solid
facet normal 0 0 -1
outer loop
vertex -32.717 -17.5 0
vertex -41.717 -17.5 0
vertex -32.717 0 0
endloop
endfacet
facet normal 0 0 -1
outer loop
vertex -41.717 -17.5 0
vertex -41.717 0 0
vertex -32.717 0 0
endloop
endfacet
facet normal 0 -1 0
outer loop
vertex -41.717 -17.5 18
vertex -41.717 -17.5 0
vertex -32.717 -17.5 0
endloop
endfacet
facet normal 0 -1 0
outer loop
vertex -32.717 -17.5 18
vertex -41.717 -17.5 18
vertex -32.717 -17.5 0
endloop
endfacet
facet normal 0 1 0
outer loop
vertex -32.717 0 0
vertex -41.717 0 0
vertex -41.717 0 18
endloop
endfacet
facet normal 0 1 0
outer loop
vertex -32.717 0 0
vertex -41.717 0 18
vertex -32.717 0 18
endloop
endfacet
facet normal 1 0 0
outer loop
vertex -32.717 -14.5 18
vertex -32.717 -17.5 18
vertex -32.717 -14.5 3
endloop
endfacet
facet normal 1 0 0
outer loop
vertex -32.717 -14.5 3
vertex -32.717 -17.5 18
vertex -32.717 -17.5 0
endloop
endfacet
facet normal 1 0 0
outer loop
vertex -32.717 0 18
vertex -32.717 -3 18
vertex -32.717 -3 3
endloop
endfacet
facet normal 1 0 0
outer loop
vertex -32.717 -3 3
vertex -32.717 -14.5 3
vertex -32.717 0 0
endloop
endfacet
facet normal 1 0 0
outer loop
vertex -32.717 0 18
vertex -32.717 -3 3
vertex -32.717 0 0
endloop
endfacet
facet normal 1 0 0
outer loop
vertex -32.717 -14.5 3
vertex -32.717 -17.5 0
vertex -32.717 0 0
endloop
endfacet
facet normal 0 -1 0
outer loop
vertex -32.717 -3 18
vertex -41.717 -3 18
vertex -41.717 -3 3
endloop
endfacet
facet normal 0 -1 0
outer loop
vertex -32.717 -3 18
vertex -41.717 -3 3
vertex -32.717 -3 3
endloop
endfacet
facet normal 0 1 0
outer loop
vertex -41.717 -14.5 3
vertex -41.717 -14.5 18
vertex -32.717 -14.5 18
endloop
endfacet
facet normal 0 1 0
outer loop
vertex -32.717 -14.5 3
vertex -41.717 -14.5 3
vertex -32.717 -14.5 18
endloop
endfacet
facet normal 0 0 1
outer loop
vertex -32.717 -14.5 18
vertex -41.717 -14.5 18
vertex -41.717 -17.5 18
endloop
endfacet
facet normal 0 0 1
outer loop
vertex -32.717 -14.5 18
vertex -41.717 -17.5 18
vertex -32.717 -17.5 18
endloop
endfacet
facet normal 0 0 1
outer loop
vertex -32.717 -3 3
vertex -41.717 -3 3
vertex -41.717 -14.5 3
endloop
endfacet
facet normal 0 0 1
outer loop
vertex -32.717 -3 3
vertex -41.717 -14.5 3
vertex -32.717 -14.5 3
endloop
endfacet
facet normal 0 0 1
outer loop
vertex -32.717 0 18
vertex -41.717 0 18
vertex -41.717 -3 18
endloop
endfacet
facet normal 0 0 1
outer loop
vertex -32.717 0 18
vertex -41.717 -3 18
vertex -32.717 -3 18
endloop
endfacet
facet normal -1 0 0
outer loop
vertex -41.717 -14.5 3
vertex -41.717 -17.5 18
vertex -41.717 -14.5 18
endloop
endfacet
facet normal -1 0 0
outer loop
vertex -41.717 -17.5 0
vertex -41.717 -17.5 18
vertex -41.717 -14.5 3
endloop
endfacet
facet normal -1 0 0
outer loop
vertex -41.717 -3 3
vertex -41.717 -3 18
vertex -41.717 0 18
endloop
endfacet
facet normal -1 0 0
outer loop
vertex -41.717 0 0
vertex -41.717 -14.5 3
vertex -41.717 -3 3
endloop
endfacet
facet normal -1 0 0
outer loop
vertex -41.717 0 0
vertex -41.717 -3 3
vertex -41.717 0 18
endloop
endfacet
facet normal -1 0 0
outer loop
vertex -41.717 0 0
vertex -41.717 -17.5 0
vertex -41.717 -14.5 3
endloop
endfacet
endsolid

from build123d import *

# Parameters (mm, degrees)
F0_W     = 9
F0_H     = 3
F1_DEPTH = 18
F0_H_2   = 11.5
F2_DEPTH = 3


with BuildPart() as f1:
    # F0 (on Top) → F1 (new body)
    with BuildSketch(Plane.XY):
        with Locations((-37.2173463006, -1.5)):
            Rectangle(F0_W, F0_H)
    extrude(amount=F1_DEPTH)



with BuildPart() as f1b:
    # F0 (on Top) → F1, piece 2 (new body)
    with BuildSketch(Plane.XY):
        with Locations((-37.2173463006, -16)):
            Rectangle(F0_W, F0_H)
    extrude(amount=F1_DEPTH)


with BuildPart() as f1_1:
    add(f1.part)

    add(f1b.part)  # F2 merges F1b
    # F0 (on Top) → F2 (join)
    with BuildSketch(Plane.XY):
        with Locations((-37.2173463006, -8.75)):
            Rectangle(F0_W, F0_H_2)
    extrude(amount=F2_DEPTH)


solid = f1_1.part
